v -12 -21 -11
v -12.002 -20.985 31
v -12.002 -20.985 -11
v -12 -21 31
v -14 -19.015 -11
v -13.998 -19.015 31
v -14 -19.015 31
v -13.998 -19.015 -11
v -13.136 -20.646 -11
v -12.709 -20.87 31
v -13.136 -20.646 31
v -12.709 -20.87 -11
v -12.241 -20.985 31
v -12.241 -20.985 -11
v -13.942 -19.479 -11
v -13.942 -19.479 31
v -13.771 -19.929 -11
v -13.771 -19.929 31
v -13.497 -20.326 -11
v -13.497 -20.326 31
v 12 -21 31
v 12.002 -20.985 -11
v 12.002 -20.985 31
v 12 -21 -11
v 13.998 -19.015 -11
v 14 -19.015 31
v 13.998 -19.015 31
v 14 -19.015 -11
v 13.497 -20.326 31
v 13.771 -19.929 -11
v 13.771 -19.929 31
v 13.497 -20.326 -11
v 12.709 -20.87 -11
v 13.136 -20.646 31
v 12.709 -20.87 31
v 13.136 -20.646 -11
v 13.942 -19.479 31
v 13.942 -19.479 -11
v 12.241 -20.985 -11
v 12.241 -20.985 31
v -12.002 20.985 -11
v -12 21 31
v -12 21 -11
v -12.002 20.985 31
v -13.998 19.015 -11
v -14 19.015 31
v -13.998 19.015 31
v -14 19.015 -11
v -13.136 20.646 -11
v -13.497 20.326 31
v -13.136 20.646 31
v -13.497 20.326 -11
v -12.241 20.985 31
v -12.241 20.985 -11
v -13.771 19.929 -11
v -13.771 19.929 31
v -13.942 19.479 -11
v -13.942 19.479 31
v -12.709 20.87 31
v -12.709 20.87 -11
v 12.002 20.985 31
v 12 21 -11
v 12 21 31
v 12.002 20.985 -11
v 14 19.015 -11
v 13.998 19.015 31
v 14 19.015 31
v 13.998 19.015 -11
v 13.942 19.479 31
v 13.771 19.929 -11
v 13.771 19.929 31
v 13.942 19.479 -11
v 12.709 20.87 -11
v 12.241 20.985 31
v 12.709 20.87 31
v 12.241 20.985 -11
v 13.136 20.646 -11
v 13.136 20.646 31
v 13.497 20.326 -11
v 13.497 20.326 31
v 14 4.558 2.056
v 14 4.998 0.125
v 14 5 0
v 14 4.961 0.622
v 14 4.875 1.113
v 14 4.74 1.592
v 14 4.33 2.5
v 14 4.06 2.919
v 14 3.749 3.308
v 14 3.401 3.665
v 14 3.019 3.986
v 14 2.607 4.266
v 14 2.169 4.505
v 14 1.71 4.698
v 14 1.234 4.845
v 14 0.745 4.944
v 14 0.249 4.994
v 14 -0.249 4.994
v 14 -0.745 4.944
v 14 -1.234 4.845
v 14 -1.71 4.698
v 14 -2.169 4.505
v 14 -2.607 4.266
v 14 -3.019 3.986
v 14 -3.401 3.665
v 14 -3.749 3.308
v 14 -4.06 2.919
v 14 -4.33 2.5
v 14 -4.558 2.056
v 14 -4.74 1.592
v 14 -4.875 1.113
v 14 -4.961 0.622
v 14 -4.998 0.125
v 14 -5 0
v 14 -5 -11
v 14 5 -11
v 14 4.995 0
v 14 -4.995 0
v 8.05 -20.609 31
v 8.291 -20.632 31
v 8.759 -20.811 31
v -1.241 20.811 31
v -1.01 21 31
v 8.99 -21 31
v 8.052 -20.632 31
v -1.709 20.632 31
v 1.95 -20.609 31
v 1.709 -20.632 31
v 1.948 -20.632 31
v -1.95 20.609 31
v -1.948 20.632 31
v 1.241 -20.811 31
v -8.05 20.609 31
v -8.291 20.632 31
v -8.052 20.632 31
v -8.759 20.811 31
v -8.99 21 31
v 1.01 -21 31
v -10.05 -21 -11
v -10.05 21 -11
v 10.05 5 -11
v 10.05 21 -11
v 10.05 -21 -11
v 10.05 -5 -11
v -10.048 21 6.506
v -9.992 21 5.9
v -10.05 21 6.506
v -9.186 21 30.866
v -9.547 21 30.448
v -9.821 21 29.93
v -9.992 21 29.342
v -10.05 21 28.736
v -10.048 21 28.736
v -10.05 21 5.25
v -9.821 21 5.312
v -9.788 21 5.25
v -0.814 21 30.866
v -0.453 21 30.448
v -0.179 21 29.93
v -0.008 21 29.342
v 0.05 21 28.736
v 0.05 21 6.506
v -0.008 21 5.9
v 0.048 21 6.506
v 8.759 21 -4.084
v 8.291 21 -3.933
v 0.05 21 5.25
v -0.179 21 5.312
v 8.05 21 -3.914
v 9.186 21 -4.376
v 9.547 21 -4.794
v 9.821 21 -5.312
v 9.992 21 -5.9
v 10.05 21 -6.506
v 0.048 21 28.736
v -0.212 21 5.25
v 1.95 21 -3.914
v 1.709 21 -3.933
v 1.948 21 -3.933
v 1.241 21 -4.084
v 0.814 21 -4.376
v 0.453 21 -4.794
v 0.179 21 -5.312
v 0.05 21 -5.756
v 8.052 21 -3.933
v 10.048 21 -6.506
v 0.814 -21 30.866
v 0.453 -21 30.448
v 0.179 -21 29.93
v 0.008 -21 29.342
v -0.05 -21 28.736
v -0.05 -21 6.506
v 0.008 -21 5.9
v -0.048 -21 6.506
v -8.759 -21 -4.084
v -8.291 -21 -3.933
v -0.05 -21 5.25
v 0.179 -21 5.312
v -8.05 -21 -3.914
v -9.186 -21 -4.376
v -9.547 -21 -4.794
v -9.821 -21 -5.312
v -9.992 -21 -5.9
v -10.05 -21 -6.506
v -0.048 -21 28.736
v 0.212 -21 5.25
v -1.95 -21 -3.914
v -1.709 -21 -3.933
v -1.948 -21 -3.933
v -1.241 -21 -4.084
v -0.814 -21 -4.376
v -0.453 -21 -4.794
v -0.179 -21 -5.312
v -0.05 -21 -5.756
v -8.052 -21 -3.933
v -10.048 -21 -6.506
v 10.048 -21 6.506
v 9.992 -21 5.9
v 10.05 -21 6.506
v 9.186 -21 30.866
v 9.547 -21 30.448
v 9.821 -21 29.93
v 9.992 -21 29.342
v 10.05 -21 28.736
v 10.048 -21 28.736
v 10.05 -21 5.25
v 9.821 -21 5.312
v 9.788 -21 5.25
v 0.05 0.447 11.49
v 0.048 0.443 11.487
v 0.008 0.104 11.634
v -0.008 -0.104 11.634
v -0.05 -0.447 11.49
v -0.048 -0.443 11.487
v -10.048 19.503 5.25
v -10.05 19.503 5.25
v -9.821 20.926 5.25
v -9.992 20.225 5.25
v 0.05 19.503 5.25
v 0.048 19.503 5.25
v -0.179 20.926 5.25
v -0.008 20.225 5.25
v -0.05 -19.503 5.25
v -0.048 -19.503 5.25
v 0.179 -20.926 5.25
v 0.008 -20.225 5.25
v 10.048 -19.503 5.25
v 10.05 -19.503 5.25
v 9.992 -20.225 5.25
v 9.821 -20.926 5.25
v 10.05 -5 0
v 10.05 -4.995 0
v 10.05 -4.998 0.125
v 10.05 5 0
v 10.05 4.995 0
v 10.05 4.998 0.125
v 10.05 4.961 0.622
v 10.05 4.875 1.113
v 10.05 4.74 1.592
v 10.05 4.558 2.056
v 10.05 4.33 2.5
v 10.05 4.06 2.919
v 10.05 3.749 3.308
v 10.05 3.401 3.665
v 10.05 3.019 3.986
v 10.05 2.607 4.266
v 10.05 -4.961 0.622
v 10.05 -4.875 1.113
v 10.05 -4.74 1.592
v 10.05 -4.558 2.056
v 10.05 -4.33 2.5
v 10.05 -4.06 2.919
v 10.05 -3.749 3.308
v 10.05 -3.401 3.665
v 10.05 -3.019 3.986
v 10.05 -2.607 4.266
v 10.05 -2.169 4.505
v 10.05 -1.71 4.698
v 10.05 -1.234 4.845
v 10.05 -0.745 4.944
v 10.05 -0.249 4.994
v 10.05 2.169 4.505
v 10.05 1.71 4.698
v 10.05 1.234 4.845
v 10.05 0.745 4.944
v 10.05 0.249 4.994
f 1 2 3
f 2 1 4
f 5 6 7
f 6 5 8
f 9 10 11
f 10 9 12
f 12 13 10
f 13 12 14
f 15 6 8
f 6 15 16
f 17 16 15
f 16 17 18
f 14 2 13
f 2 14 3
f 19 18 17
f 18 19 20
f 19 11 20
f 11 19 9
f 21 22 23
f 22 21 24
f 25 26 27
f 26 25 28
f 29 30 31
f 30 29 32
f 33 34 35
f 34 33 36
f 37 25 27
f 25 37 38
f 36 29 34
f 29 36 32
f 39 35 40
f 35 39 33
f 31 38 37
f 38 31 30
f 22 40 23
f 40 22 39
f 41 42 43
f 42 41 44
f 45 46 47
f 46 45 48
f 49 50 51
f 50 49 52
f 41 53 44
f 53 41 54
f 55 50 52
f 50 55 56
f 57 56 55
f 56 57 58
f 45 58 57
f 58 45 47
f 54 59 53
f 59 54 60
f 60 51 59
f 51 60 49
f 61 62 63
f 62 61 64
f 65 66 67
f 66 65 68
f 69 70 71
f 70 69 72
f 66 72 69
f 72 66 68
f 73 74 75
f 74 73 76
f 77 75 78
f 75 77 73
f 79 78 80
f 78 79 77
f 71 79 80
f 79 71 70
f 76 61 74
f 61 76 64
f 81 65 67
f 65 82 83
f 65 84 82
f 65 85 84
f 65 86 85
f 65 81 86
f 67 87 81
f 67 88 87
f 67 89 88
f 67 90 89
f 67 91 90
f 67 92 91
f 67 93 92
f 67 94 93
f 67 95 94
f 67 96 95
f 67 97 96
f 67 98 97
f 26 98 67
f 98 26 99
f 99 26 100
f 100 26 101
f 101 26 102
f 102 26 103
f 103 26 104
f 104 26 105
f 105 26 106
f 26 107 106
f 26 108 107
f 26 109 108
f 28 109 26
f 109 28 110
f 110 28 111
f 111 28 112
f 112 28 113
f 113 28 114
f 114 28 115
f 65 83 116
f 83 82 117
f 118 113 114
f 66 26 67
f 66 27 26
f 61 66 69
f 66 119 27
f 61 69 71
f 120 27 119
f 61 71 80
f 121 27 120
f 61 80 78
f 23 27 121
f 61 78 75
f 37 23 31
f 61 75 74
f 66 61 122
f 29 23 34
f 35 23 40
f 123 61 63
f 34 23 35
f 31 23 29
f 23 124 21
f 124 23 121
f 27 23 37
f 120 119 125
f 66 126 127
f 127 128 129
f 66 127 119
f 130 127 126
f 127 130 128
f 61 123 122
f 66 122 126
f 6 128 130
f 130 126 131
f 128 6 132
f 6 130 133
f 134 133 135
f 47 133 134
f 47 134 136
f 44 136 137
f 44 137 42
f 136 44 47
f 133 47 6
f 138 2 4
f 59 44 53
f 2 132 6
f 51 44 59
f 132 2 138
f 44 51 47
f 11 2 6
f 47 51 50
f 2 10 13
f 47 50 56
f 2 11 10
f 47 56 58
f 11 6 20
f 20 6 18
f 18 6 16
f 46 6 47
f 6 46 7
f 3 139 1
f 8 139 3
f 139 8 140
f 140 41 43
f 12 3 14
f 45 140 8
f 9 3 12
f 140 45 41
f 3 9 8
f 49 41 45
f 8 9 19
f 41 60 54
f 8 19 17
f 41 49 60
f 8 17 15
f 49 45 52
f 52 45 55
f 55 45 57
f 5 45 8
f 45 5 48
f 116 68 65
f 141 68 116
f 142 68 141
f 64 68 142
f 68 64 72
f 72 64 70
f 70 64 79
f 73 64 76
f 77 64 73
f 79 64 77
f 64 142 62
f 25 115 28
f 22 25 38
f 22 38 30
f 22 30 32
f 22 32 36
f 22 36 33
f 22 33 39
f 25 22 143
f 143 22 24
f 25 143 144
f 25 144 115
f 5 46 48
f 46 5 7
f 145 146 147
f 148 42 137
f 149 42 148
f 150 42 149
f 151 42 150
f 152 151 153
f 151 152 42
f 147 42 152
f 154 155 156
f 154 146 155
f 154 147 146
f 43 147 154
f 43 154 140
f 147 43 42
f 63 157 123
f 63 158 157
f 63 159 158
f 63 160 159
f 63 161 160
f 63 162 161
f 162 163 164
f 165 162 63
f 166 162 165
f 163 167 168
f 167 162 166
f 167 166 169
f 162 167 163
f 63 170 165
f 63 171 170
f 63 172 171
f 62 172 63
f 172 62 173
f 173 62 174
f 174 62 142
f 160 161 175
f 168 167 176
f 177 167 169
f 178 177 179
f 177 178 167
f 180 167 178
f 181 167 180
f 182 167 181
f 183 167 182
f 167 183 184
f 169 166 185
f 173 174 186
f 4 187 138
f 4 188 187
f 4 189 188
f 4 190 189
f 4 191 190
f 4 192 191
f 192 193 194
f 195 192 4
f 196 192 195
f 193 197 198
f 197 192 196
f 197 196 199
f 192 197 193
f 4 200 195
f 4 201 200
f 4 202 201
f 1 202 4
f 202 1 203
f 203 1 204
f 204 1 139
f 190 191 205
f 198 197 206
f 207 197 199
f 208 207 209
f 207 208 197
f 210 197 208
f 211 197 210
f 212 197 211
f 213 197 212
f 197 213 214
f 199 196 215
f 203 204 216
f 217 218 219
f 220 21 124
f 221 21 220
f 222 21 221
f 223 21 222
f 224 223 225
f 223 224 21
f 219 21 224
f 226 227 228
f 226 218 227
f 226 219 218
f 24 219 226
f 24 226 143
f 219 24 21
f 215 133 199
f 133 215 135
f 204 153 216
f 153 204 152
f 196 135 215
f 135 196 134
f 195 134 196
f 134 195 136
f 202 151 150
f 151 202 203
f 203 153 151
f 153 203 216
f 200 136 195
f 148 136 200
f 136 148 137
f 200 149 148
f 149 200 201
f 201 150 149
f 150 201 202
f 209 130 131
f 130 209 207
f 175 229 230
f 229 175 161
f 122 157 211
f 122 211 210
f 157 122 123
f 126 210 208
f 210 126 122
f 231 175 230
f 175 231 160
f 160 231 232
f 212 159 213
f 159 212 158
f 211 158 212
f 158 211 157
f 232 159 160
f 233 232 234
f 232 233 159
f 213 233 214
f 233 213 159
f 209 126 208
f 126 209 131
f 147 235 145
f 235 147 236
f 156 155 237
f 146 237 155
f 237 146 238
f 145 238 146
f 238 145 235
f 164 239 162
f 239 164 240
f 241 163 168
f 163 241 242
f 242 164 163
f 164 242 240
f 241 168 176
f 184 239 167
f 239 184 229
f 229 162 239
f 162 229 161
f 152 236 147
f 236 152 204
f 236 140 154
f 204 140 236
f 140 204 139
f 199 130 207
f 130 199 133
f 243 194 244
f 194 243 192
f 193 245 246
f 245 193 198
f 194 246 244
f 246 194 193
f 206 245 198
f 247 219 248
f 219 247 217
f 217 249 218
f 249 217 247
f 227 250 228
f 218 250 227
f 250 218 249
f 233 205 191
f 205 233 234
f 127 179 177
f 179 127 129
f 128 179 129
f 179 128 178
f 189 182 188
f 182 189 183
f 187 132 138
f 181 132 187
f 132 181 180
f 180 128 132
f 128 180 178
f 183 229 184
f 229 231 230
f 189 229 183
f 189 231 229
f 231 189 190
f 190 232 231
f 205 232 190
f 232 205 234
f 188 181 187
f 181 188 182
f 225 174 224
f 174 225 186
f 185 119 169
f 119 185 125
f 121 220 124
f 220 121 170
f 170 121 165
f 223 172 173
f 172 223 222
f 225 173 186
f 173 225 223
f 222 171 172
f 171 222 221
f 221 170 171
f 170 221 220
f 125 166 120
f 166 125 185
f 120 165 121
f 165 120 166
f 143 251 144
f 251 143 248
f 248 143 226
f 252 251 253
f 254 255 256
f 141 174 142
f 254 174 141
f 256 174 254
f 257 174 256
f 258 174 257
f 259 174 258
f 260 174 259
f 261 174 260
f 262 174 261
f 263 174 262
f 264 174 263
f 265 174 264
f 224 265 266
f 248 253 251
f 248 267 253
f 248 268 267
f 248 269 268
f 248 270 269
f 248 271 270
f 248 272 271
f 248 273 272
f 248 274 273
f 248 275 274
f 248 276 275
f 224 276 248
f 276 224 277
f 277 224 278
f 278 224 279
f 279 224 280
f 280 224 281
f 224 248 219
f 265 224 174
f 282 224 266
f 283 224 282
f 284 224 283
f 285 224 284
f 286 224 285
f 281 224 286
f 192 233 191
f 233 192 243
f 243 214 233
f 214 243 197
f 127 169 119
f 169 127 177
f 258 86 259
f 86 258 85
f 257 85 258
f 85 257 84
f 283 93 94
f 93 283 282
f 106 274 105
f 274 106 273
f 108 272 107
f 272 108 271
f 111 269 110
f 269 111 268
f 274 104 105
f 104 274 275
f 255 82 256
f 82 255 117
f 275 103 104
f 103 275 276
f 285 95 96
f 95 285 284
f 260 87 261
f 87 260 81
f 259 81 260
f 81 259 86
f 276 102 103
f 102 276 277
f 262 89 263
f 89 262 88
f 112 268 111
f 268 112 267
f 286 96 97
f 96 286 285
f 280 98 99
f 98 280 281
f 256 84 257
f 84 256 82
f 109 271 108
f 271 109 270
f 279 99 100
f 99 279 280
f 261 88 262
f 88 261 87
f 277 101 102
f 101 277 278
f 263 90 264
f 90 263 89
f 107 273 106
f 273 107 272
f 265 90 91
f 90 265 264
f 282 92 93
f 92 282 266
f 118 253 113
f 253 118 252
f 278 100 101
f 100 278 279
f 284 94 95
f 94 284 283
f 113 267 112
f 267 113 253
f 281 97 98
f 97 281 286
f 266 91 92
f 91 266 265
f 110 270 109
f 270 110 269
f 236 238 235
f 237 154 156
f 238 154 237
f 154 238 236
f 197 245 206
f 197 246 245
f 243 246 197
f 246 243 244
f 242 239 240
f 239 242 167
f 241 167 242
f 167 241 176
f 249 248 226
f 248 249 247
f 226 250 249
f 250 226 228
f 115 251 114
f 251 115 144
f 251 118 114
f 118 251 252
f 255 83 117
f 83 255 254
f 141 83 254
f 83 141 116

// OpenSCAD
// file: ../RoundRectangle/RoundRectangle.scad
$fs = 0.5;
$fa = 1;

module round_rectangle(dims, corner_radius) {
    difference() {
        cube(dims, center=true);
        for (i=[0:3]) {
            difference() {
                translate([(i % 2 - 0.5) * dims[0], (floor(i / 2) - 0.5) * dims[1], 0])
                cylinder(r=corner_radius, h=2 * dims[2], center=true);
                translate([(i % 2 - 0.5) * (dims[0] - 2 * corner_radius), (floor(i / 2) - 0.5) * (dims[1] - 2 * corner_radius), 0])
                cylinder(r=corner_radius, h=3 * dims[2], center=true);
            }
        }
    }
}
// main file
include <../RoundRectangle/RoundRectangle.scad>

$fa = 1;
$fs = 0.5;

board_width = 10;
board_length = 21;
board_height = 200;
dowel_radius = 5;
x_margin = 4;
y_shift = 10;
overlap = 0.1;

// color([1, .8, .3])
// wood();

color([.3, .3, .3])
block();

module wood(bonus = 0) {
 
    union() {
        // The two angled boards
        for (i=[-1:2:1]) {
        translate([i * board_width / 2, 0, 0])
        rotate([i * 50, 0, 0])
        round_rectangle([bonus + board_width, board_length, board_height], corner_radius = 2);
        }

        // The dowel
        rotate([0, 90, 0])
        cylinder(r=dowel_radius, h=board_height);
    }
    
}

module block() {
    
    difference() {
        translate([0, 0, y_shift])
        round_rectangle([2 * (x_margin + board_width), 2 * board_length, 2 * board_length], corner_radius = 2);
        
        wood(bonus = overlap);
        
        // Cuts
        for (i=[-1:2:1]) {
            translate([-i * board_width / 2, i * board_length, -board_length / 4])
            cube([overlap + board_width, board_length * 2, board_length], center=true);
        }
        
        // For dowel
        rotate([180, 0, 0])
        translate([board_width, -dowel_radius, 0])
        cube([x_margin * 2, dowel_radius * 2, 2 * y_shift]);
   }
    
}
